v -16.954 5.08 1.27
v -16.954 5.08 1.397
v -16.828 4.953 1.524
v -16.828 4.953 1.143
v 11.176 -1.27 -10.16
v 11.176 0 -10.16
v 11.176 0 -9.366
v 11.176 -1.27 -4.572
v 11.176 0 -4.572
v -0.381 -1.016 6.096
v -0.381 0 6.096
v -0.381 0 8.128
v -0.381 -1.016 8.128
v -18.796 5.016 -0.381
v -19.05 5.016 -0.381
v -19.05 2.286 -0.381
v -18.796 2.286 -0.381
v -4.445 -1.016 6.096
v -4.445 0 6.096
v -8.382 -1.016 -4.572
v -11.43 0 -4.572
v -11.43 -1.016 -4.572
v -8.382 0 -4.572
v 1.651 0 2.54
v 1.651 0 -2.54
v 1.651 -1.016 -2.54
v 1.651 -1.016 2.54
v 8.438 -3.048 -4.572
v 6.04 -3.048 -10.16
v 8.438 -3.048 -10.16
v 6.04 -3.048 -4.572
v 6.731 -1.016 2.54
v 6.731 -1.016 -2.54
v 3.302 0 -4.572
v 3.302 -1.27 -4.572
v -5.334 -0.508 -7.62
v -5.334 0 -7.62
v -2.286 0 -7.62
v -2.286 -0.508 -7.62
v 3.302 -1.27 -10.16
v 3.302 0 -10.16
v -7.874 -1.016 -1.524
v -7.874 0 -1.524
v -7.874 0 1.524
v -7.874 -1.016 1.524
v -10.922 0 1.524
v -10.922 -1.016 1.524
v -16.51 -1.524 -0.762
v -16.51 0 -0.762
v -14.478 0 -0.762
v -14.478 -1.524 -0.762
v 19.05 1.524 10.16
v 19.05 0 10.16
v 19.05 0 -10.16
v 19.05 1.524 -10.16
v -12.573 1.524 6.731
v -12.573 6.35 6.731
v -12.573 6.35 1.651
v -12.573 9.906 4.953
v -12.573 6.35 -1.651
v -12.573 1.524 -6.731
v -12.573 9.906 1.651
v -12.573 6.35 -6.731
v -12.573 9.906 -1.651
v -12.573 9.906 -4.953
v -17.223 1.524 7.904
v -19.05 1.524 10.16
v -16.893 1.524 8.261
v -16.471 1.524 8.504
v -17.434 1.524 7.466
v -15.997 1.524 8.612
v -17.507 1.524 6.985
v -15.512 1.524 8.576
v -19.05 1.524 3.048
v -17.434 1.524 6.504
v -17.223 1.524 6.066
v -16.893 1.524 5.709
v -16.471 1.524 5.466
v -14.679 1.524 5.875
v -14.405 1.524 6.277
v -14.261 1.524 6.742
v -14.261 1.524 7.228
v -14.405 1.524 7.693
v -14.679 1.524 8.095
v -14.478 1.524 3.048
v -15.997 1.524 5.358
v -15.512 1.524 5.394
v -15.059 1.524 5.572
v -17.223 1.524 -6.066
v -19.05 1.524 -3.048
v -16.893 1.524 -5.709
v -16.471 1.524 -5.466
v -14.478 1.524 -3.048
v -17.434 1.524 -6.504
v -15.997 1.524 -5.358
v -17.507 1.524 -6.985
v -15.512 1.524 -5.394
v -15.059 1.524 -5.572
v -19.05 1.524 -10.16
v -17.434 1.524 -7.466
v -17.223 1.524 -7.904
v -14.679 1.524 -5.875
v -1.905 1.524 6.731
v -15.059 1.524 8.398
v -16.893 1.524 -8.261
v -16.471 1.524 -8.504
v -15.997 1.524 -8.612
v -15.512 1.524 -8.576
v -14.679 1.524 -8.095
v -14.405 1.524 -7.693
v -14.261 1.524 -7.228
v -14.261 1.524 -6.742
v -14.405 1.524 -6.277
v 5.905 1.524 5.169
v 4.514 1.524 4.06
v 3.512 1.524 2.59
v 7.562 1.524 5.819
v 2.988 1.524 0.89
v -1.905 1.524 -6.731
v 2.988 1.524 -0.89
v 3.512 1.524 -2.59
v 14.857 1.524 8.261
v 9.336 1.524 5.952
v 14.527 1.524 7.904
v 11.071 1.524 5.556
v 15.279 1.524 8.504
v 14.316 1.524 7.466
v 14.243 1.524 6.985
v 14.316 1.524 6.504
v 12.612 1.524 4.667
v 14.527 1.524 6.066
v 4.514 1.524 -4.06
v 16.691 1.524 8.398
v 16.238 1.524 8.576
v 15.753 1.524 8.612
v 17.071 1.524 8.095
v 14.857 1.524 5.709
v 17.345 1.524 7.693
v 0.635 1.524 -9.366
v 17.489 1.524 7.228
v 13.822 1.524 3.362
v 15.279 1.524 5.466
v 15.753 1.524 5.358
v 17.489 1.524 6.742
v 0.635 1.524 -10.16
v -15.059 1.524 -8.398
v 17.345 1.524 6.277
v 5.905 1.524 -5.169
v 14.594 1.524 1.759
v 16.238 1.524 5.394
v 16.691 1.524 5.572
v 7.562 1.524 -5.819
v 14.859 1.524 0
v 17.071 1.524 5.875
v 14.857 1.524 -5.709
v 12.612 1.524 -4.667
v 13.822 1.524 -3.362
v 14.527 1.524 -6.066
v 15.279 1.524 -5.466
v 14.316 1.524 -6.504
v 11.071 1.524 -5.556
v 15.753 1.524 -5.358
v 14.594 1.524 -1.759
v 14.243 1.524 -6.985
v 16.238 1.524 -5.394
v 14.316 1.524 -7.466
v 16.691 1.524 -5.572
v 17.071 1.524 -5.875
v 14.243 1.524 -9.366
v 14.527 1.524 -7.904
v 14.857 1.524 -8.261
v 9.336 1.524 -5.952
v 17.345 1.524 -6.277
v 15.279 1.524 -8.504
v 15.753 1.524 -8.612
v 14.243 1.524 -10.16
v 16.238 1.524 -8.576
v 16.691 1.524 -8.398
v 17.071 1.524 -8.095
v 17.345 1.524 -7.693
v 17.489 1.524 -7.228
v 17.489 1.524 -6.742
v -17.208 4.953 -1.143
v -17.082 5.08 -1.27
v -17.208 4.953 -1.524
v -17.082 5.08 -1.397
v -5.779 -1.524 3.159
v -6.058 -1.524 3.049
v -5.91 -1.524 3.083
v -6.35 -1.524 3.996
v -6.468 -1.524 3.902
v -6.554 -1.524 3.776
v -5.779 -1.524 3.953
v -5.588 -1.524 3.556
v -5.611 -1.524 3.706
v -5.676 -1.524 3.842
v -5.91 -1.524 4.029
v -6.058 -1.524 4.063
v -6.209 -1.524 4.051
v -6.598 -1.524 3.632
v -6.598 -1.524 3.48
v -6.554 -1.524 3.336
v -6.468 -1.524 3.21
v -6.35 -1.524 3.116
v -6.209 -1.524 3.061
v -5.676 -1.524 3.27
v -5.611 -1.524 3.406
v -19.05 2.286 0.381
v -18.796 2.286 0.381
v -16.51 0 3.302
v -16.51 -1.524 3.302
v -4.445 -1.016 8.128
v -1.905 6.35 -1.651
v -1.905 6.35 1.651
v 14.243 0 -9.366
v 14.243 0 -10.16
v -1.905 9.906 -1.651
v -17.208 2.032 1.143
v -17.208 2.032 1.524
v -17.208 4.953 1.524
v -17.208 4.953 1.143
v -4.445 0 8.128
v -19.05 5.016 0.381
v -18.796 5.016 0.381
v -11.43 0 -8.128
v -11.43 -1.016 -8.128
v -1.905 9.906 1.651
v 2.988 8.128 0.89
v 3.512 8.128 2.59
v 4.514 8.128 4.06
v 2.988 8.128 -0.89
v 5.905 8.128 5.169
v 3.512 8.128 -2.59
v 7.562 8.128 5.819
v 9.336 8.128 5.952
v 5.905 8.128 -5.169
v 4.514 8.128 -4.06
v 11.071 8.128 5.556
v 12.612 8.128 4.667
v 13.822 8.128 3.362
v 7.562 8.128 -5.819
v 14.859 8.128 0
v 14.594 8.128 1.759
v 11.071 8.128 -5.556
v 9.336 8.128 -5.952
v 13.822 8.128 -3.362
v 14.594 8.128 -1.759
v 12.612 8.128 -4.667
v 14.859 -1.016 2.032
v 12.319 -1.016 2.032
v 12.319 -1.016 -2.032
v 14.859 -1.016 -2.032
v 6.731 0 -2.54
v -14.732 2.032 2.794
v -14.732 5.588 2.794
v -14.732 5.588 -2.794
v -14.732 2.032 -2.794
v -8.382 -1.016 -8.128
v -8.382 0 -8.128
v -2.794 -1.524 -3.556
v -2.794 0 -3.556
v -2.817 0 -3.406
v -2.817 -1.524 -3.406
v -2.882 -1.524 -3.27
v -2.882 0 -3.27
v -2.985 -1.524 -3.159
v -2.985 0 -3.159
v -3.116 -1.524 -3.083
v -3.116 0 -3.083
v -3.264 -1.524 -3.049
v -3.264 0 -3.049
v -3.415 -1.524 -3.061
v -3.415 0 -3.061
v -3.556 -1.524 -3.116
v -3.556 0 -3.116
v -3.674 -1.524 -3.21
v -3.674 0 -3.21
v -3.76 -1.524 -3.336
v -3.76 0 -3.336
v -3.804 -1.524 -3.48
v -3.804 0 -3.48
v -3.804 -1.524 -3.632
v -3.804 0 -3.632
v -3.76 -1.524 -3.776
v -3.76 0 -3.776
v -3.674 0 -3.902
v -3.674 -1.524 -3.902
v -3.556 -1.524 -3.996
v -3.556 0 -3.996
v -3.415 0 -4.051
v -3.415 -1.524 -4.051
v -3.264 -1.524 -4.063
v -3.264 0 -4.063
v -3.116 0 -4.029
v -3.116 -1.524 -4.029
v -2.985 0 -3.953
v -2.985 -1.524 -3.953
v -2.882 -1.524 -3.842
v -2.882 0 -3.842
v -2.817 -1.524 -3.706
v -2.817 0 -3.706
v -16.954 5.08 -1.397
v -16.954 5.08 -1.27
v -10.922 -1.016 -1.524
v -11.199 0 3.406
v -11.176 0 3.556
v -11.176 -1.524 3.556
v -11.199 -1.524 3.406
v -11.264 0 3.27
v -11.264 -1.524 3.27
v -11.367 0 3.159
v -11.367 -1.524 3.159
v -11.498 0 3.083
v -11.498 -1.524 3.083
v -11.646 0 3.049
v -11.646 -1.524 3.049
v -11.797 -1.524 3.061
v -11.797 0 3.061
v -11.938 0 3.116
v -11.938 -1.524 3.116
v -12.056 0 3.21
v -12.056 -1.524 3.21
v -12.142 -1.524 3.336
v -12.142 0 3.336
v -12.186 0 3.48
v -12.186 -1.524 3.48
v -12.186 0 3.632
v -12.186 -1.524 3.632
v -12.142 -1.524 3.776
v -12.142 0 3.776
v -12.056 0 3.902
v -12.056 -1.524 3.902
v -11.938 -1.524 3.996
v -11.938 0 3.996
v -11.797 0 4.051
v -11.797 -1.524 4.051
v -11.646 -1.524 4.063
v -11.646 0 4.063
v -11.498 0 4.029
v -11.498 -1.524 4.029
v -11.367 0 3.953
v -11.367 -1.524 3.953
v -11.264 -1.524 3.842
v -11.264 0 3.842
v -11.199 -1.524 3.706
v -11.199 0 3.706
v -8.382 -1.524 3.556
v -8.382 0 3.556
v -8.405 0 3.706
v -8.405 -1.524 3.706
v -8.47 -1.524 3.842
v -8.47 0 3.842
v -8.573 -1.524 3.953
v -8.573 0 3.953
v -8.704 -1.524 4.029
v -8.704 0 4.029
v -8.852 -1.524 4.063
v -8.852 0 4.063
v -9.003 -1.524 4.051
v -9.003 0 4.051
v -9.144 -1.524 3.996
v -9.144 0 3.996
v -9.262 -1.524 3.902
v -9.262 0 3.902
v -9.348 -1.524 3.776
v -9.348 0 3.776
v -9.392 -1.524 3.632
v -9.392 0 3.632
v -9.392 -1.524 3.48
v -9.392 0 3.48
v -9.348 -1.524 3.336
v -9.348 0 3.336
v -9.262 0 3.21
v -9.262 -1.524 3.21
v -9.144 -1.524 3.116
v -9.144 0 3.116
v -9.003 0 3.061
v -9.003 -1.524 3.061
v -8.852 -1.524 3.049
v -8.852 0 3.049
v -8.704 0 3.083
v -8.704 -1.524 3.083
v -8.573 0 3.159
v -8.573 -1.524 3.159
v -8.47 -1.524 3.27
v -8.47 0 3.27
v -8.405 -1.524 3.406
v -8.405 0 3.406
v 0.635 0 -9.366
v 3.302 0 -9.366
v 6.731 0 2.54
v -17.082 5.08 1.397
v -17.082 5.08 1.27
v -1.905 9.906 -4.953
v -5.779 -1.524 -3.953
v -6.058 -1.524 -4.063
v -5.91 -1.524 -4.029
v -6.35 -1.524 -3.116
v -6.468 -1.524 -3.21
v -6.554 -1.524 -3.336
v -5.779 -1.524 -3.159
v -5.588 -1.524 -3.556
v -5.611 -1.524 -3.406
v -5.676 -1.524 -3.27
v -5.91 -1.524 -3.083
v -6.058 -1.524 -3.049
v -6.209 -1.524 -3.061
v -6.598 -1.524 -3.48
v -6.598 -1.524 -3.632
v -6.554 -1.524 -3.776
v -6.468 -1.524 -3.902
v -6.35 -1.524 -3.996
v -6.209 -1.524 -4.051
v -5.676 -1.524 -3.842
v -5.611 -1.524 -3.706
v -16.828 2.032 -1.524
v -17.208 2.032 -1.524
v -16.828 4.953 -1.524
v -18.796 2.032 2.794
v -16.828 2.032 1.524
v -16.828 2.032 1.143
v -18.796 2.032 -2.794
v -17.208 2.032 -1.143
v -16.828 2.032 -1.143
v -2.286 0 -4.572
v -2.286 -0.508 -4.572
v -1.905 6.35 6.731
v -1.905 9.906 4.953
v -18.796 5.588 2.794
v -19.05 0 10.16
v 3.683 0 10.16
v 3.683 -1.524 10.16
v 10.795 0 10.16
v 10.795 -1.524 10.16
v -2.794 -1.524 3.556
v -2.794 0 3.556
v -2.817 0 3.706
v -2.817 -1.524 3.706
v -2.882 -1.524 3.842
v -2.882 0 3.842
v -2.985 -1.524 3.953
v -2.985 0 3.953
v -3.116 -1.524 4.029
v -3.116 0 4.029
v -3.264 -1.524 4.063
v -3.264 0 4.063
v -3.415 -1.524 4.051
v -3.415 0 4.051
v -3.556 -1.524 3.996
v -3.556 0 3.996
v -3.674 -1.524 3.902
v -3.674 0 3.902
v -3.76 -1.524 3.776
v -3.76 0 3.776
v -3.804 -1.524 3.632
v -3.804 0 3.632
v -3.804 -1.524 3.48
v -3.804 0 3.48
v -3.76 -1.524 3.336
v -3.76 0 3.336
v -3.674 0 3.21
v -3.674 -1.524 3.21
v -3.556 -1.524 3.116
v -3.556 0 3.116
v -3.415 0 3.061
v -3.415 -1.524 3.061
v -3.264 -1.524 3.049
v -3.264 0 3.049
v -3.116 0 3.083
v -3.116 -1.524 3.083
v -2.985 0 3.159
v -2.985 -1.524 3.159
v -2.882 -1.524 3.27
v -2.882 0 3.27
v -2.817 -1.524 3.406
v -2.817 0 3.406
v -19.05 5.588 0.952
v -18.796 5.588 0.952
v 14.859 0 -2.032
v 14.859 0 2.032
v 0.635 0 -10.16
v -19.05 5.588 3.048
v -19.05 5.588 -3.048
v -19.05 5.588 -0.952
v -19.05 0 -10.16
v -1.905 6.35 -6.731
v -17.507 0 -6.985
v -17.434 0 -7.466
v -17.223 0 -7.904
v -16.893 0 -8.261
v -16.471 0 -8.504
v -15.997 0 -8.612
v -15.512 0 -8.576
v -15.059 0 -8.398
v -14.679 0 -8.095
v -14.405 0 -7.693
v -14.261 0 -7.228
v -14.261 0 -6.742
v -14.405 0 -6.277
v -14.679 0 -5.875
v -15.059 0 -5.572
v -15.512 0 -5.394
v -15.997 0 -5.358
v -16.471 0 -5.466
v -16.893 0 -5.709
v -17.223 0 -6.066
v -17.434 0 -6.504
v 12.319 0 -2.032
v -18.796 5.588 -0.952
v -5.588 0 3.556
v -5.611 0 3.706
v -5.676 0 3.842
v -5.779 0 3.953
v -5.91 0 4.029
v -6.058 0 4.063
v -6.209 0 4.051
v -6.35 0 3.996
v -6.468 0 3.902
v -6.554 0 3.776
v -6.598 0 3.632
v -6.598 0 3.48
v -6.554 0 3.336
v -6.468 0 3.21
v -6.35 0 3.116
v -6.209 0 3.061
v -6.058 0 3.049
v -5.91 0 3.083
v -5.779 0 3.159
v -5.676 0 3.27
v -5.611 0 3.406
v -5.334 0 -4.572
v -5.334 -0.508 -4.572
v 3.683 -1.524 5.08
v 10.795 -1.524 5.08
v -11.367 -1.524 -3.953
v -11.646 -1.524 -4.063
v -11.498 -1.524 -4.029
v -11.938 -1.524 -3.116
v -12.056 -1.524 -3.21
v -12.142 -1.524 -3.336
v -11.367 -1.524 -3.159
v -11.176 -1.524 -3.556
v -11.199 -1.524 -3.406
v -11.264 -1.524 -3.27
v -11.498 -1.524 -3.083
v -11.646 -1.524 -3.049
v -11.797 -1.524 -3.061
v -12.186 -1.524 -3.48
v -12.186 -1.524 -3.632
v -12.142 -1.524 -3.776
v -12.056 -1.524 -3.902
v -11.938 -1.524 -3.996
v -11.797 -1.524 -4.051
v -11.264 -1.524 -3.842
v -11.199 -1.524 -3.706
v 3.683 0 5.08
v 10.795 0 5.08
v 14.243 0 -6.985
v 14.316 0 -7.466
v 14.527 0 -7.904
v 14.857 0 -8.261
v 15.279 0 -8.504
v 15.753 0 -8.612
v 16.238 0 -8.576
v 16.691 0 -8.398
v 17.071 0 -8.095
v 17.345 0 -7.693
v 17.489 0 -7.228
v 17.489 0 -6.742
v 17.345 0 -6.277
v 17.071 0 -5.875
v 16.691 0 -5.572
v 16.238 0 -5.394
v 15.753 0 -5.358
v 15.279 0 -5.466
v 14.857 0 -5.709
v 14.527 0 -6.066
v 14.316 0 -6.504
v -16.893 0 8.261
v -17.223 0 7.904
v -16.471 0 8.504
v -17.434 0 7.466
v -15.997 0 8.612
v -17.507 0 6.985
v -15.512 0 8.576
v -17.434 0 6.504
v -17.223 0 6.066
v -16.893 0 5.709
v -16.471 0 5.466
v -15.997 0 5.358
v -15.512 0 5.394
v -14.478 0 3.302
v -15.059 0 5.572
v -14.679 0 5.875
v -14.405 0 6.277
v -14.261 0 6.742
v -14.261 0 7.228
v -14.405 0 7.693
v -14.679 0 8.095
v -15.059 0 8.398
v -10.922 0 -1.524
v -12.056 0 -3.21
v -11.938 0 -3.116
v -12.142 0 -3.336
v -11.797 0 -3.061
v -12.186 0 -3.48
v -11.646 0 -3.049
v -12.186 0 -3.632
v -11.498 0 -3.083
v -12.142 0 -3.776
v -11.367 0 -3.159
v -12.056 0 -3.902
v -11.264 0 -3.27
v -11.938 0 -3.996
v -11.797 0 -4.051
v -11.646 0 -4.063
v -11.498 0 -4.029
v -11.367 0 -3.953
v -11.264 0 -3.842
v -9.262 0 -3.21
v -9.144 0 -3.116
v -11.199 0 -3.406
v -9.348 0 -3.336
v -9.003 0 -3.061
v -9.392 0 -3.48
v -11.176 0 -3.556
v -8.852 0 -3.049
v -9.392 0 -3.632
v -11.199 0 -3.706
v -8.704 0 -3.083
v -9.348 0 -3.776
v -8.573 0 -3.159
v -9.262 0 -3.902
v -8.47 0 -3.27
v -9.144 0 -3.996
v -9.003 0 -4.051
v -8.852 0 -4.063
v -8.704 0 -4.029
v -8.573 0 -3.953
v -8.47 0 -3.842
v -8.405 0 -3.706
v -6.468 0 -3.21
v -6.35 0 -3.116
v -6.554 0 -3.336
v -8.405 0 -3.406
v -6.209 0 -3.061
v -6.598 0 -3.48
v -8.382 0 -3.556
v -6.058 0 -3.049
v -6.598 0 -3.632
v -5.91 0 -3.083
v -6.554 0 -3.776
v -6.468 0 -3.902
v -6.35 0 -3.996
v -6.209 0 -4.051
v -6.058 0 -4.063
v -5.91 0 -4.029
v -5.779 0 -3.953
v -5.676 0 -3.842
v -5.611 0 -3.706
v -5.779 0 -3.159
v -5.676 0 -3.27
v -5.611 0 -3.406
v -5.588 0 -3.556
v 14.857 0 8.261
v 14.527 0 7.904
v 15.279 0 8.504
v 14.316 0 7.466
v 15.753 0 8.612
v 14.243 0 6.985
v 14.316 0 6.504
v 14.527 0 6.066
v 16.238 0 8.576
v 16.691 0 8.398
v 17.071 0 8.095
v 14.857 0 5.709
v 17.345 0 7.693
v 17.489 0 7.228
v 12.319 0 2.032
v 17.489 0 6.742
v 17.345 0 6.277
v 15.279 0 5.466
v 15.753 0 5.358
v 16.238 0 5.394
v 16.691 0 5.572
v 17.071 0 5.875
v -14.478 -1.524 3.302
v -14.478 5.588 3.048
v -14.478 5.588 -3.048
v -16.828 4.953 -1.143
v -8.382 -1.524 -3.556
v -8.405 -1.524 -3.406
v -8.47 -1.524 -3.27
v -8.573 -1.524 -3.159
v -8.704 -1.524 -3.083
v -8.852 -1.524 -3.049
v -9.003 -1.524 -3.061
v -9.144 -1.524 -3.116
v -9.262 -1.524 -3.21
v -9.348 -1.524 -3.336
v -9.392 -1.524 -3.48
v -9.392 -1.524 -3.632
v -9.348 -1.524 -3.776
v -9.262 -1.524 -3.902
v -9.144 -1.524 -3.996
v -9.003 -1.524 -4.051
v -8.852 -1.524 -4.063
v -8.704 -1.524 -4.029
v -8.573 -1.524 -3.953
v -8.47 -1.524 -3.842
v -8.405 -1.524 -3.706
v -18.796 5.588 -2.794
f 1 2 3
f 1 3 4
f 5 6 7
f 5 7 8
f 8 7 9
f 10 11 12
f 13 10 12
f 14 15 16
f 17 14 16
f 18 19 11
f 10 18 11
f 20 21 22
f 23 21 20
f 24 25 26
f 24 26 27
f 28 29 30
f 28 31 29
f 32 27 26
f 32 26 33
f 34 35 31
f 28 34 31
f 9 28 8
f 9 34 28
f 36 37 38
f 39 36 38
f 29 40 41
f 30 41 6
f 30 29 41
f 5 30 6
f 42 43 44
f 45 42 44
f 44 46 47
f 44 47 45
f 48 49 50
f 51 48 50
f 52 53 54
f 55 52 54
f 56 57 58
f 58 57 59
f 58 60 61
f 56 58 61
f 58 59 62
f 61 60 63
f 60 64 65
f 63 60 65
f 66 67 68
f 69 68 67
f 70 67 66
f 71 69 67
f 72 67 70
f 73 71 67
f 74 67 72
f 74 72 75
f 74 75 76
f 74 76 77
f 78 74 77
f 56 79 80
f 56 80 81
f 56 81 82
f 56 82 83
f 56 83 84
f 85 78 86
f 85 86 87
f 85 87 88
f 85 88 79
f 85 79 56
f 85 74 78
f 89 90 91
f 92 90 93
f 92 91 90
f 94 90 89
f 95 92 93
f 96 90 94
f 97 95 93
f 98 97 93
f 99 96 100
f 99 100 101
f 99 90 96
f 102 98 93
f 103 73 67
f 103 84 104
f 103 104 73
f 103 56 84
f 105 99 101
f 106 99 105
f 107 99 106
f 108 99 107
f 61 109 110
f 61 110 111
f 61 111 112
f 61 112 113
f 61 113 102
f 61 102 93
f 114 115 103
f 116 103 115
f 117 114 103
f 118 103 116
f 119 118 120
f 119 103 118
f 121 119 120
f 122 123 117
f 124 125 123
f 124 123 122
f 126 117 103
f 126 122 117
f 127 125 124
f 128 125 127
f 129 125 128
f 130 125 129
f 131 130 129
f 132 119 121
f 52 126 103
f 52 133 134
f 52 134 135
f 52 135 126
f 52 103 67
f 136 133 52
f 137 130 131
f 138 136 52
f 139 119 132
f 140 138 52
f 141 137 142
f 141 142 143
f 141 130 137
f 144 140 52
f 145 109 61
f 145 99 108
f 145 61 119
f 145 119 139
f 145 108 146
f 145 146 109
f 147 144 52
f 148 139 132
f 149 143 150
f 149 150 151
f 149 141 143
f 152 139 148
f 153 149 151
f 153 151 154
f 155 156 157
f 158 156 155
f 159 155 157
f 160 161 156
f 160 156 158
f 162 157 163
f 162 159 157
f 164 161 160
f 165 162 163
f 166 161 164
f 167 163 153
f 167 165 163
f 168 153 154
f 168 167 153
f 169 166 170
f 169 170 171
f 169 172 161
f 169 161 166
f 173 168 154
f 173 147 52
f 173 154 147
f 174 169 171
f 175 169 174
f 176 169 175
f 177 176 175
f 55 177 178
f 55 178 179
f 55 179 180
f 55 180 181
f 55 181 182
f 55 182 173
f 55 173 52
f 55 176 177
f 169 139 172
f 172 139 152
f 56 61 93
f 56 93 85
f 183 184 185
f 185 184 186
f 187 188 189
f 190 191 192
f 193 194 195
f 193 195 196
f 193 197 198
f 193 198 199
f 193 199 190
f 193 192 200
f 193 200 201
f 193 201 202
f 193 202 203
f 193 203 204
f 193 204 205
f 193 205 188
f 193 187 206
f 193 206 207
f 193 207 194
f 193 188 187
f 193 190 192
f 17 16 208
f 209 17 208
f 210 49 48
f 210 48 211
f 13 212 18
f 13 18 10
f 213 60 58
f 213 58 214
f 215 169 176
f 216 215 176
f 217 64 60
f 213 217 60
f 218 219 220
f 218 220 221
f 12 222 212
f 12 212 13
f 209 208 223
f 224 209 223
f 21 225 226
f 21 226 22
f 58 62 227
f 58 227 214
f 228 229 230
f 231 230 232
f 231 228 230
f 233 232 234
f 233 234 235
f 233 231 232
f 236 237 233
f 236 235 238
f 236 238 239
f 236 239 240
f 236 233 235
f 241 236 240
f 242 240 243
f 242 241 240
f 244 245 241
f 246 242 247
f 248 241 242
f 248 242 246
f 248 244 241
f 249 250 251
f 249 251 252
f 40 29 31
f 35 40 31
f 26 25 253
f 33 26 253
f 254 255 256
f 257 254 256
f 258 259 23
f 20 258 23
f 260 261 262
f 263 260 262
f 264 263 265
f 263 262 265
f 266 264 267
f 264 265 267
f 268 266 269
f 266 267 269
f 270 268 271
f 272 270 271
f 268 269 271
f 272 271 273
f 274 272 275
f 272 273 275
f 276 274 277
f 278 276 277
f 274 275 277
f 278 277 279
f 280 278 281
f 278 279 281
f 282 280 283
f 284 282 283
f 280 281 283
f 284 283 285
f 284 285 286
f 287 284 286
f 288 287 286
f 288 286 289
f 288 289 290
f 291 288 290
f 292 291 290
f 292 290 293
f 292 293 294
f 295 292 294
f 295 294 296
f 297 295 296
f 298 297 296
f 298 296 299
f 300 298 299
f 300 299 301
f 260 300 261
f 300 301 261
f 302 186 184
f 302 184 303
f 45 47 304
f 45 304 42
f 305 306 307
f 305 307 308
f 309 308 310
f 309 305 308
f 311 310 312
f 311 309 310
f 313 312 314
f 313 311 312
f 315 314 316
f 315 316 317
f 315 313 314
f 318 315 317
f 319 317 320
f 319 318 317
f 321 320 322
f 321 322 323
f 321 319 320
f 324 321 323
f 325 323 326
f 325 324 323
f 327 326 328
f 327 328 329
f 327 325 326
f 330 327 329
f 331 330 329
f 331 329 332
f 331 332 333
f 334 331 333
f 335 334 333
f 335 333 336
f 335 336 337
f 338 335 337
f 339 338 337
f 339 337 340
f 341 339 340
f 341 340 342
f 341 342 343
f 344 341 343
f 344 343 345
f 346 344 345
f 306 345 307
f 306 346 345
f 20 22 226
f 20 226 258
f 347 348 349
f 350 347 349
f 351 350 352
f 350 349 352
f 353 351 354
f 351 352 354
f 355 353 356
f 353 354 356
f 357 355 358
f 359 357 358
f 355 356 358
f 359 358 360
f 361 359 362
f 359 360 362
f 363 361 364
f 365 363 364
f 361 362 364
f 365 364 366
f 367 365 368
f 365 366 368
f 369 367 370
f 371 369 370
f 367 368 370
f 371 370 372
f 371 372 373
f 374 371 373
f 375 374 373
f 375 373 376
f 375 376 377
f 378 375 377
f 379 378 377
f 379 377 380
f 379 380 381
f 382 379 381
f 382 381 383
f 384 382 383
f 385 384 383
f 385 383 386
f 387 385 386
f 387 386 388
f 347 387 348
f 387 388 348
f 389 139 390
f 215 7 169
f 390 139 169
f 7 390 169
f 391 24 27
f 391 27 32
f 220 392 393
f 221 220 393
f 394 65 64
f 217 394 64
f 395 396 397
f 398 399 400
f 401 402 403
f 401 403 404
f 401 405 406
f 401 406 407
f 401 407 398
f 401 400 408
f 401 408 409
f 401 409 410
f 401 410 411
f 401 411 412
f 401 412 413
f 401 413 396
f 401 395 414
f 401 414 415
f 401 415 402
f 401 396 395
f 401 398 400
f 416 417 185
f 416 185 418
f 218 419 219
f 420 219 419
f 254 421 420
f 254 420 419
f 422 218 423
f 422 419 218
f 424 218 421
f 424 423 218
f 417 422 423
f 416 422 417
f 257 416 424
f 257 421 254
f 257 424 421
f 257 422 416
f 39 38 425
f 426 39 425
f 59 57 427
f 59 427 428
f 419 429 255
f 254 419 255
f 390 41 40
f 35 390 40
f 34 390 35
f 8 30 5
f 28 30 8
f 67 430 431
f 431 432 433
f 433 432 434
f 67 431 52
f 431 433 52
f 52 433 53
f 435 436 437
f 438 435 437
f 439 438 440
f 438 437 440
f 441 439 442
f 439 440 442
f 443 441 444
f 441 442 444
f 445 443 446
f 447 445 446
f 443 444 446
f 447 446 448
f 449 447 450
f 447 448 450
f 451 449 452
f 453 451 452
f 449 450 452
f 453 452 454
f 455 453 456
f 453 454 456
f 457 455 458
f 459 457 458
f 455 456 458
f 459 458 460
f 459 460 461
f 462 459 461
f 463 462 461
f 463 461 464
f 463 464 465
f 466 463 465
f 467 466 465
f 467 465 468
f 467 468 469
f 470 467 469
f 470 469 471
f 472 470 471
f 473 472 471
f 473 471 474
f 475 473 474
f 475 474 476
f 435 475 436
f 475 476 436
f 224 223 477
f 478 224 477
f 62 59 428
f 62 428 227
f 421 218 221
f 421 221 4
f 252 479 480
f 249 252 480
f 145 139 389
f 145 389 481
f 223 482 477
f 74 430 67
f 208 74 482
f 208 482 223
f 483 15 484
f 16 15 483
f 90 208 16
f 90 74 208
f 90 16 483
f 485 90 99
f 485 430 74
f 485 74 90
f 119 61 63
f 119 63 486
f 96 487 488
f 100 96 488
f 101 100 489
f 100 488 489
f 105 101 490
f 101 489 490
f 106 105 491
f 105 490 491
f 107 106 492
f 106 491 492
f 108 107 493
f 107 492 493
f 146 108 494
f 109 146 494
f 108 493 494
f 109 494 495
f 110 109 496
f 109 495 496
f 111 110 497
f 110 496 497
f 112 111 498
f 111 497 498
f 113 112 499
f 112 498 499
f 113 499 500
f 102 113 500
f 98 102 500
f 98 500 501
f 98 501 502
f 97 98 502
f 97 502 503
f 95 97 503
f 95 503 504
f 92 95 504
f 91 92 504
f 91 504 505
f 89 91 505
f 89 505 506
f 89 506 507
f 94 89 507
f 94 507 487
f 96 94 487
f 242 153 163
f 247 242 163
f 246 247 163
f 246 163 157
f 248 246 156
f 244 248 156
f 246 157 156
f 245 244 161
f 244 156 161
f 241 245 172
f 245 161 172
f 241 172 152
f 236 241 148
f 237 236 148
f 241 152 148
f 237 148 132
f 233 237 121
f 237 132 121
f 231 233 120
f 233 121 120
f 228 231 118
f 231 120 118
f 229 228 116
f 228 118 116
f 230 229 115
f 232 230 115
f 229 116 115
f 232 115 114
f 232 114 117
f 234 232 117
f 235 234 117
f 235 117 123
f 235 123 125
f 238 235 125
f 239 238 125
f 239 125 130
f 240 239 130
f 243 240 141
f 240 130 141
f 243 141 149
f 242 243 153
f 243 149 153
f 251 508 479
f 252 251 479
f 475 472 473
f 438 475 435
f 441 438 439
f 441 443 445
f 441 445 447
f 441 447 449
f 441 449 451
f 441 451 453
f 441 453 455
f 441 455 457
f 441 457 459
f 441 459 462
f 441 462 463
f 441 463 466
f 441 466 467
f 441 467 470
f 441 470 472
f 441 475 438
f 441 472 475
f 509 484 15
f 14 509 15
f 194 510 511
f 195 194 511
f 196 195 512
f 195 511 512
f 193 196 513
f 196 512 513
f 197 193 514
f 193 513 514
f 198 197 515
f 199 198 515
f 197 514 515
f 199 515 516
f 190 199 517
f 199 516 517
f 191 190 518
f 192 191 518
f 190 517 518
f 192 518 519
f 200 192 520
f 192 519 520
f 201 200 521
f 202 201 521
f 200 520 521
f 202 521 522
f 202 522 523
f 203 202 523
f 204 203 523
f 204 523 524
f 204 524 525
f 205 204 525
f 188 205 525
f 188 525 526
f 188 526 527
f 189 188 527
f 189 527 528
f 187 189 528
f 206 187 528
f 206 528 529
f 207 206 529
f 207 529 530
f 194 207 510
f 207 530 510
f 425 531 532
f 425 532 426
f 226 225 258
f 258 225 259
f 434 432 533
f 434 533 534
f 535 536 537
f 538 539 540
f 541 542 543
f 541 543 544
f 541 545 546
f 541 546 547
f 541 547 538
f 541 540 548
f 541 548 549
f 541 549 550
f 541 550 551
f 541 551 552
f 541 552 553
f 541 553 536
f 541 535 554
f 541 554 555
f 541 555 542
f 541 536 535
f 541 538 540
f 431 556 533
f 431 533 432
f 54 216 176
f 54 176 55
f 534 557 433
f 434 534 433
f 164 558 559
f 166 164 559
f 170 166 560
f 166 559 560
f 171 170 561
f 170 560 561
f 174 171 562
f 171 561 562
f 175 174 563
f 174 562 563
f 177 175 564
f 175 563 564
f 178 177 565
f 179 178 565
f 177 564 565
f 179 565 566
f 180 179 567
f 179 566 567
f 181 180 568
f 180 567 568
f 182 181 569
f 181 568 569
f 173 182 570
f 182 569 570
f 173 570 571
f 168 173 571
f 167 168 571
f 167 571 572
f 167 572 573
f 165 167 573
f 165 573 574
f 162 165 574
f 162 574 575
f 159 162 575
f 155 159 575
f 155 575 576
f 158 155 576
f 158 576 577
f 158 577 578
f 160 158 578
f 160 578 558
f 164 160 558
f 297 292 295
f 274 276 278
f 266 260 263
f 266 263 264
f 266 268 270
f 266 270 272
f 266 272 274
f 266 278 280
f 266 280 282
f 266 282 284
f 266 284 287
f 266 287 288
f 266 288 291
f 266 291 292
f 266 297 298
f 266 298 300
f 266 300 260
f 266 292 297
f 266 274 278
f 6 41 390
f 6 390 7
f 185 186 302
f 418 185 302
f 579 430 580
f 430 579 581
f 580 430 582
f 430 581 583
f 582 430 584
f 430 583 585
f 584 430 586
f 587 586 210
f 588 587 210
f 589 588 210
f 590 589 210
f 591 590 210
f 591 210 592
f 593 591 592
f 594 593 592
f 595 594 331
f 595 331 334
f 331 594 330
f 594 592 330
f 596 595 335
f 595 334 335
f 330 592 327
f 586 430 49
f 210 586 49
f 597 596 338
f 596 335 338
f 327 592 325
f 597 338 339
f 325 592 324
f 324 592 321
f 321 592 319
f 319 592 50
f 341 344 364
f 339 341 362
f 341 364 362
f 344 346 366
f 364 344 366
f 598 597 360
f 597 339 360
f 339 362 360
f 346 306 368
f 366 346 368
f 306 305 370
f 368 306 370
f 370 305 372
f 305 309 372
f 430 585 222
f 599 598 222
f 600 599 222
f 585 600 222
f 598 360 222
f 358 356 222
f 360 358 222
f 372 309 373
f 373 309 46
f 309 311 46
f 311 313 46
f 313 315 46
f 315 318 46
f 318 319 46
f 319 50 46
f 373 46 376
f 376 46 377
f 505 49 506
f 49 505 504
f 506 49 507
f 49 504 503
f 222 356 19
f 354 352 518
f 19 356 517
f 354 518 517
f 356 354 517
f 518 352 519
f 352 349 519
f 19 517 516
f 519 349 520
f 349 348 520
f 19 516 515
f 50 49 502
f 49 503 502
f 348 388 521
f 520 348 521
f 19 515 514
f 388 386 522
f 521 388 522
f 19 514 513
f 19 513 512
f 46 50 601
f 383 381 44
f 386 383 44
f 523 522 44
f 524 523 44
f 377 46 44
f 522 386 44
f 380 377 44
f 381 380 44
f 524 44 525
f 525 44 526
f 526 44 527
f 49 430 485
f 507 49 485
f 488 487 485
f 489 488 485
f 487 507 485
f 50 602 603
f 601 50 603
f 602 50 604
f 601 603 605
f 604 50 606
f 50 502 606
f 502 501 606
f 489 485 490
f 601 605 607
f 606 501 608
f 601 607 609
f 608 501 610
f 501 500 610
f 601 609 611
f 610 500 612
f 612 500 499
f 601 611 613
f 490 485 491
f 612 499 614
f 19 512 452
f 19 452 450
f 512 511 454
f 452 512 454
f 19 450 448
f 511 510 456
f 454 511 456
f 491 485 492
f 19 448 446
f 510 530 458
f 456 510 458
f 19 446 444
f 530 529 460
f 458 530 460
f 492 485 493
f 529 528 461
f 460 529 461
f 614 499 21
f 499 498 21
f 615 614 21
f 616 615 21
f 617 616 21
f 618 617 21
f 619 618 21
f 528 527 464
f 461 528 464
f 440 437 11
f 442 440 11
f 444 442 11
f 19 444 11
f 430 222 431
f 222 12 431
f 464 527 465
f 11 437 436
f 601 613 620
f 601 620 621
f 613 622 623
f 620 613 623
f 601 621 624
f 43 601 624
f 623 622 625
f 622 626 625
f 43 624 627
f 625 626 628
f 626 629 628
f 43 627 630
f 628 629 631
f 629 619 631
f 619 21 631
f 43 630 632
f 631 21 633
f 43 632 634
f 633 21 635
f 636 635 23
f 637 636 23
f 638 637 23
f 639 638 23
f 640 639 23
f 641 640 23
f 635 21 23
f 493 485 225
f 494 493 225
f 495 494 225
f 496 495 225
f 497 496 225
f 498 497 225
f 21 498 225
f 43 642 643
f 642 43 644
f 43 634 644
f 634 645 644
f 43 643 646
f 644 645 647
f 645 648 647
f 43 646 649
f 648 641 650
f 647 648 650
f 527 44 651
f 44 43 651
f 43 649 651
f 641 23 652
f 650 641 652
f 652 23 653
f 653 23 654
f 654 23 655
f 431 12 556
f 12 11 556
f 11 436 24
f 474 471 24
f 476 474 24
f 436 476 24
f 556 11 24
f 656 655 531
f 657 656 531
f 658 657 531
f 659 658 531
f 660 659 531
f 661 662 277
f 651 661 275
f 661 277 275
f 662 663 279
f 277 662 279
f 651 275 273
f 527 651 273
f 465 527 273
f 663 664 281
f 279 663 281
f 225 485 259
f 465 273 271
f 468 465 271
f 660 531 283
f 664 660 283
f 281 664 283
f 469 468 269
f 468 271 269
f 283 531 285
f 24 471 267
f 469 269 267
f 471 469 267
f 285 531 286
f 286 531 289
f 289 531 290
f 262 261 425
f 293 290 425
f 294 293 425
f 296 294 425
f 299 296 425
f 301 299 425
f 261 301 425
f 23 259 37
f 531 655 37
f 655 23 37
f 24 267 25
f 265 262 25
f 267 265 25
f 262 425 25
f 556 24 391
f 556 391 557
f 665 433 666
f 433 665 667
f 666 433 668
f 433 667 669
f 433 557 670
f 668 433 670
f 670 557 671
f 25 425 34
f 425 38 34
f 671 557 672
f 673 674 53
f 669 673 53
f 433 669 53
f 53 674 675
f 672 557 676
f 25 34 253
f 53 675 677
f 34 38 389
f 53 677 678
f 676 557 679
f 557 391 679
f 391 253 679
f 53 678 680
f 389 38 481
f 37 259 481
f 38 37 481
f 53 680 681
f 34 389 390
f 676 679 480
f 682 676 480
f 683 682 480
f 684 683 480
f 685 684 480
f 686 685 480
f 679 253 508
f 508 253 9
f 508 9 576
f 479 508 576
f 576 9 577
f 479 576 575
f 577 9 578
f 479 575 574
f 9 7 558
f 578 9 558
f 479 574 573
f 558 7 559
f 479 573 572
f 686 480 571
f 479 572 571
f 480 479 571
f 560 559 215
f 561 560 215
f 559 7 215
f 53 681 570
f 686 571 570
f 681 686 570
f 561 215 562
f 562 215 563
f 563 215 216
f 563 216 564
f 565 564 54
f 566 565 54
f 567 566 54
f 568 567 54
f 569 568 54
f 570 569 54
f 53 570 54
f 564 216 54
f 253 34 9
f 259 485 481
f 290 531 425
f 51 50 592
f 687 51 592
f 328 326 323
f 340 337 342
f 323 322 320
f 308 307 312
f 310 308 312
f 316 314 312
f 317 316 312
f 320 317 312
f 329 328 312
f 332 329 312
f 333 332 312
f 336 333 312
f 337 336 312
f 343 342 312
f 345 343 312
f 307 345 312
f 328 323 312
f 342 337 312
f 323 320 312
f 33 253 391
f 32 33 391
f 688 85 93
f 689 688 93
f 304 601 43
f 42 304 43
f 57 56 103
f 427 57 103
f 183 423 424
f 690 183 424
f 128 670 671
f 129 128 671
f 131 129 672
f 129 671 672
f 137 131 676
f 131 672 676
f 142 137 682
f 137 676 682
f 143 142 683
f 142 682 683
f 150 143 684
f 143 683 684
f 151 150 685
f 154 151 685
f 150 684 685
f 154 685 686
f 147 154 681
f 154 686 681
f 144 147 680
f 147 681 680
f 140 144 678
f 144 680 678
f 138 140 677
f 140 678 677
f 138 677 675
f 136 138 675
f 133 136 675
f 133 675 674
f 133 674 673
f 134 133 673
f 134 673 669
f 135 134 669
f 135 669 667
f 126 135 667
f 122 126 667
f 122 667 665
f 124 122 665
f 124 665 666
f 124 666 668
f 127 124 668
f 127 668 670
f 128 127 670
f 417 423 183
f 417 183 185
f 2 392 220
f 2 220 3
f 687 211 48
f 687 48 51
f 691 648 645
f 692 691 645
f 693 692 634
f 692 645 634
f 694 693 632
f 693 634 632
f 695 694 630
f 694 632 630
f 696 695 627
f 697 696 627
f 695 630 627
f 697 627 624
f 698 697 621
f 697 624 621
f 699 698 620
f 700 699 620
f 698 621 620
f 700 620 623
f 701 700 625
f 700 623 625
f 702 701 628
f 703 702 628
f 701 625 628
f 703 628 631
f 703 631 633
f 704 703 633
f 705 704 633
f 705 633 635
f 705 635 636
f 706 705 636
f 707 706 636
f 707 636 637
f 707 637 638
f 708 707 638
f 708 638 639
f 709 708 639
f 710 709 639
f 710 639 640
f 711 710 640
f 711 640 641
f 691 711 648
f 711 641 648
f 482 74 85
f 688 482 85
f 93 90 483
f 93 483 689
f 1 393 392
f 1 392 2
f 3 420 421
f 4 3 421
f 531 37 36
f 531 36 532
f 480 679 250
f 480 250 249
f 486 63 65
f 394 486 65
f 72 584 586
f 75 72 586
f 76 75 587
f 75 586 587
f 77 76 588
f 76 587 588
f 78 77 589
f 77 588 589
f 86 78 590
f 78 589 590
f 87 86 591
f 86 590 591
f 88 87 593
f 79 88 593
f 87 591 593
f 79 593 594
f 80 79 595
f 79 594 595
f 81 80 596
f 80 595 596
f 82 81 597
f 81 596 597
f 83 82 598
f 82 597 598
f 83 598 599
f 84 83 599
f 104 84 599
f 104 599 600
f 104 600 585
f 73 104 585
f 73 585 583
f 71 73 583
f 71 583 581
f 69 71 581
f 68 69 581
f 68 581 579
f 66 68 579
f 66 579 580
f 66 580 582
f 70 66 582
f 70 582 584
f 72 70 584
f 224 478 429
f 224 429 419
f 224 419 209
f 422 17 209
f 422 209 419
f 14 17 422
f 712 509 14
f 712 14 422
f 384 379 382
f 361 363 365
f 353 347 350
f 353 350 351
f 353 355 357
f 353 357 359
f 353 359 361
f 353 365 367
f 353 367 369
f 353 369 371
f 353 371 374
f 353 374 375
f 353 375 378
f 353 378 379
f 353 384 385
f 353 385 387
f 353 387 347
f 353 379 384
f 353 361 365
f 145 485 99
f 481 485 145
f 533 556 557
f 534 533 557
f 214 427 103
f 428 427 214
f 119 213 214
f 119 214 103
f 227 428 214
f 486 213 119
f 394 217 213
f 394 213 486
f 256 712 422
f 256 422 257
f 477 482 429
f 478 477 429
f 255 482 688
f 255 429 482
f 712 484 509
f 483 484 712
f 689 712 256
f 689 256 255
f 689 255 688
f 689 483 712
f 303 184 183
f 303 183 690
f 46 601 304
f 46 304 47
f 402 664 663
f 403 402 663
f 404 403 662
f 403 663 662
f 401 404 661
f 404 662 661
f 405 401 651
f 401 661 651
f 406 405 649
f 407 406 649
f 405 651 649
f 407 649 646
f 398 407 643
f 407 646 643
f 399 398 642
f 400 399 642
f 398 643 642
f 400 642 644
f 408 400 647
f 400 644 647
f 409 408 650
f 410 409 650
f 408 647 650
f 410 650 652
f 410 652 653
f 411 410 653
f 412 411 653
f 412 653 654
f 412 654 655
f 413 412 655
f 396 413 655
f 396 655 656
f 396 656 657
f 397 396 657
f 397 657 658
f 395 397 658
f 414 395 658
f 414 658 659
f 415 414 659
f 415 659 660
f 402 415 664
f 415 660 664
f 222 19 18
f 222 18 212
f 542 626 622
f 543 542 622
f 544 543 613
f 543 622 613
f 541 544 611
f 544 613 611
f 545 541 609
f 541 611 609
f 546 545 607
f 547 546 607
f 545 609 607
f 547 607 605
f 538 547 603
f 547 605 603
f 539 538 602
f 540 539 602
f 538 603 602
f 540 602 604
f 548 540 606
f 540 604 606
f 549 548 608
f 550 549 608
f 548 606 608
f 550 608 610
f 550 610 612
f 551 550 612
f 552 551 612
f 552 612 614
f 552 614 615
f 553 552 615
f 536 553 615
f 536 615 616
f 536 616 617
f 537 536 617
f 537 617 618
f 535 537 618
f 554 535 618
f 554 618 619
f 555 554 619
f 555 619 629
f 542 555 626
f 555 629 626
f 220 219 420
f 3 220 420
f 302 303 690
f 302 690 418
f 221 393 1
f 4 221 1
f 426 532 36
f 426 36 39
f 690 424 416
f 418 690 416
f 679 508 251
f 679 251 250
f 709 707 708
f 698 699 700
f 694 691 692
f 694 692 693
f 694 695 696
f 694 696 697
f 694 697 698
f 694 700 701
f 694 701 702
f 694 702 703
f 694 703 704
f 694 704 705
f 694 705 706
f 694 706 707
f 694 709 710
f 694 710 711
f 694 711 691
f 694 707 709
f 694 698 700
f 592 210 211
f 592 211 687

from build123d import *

# Parameters (mm, degrees)
SKETCH1_W               = 38.1
SKETCH1_H               = 20.32
BOSS_EXTRUDE1_DEPTH     = 1.524
F_4_CLEARANCE_HOLE1_D   = 3.2639
SKETCH4_W               = 4.572
SKETCH4_H               = 6.096
BOSS_EXTRUDE2_DEPTH     = 4.064
SKETCH5_R               = 5.969
BOSS_EXTRUDE3_DEPTH     = 6.604
SKETCH6_W               = 10.668
SKETCH6_H               = 13.462
BOSS_EXTRUDE4_DEPTH     = 4.826
BOSS_EXTRUDE5_DEPTH     = 10.668
SKETCH8_W               = 7.874
SKETCH8_H               = 5.588
BOSS_EXTRUDE6_DEPTH     = 3.048
SKETCH9_W               = 7.112
SKETCH9_H               = 5.08
BOSS_EXTRUDE7_DEPTH     = 1.524
SKETCH10_W              = 2.54
SKETCH10_H              = 4.064
BOSS_EXTRUDE8_DEPTH     = 1.016
SKETCH11_W              = 5.08
SKETCH11_H              = 5.08
BOSS_EXTRUDE9_DEPTH     = 1.016
SKETCH12_W              = 4.064
SKETCH12_H              = 2.032
BOSS_EXTRUDE10_DEPTH    = 1.016
SKETCH13_W              = 3.048
SKETCH13_H              = 3.048
BOSS_EXTRUDE11_DEPTH    = 0.508
SKETCH14_W              = 3.048
SKETCH14_H              = 3.556
BOSS_EXTRUDE12_DEPTH    = 1.016
SKETCH15_W              = 2.032
SKETCH15_H              = 4.064
BOSS_EXTRUDE13_DEPTH    = 1.524
SKETCH16_W              = 3.048
SKETCH16_H              = 3.048
BOSS_EXTRUDE14_DEPTH    = 1.016
SKETCH17_R              = 0.508
BOSS_EXTRUDE15_DEPTH    = 1.524
LPATTERN1_COUNT         = 4
LPATTERN1_PITCH         = 2.794
MIRROR1_COPY_1_SKETCH_R = 0.508
MIRROR1_COPY_1_DEPTH    = 1.524
MIRROR1_COPY_2_SKETCH_R = 0.508
MIRROR1_COPY_2_DEPTH    = 1.524
MIRROR1_COPY_3_SKETCH_R = 0.508
MIRROR1_COPY_3_DEPTH    = 1.524
SKETCH22_W              = 13.60805
SKETCH22_H              = 0.79375
CUT_EXTRUDE2_DEPTH      = 1.524
SKETCH24_W              = 4.064
SKETCH24_H              = 5.588
CUT_EXTRUDE3_DEPTH      = 3.556
SKETCH25_W              = 0.381
SKETCH25_H              = 0.381
BOSS_EXTRUDE16_DEPTH    = 3.048
CHAMFER1_SIZE           = 0.127
CUT_EXTRUDE4_DEPTH      = 0.254
CHAMFER2_SIZE           = 1.778
CHAMFER2_SIZE2          = 2.737879906
CHAMFER2_PART_2_SIZE    = 1.778
CHAMFER2_PART_2_SIZE2   = 2.737879906


with BuildPart() as part:
    # Sketch1 → Boss-Extrude1 (new body)
    with BuildSketch(Plane(origin=(0, 0, 0), x_dir=(1, 0, 0), z_dir=(0, 1, 0))):
        Rectangle(SKETCH1_W, SKETCH1_H)
    extrude(amount=BOSS_EXTRUDE1_DEPTH)

    # #4 Clearance Hole1 (through all)
    with Locations(Plane(origin=(0, 1.524, 0), x_dir=(1, 0, 0), z_dir=(0, 1, 0))):
        with Locations((-15.875, 6.985), (15.875, -6.985), (-15.875, -6.985), (15.875, 6.985)):
            Hole(F_4_CLEARANCE_HOLE1_D / 2)

    # Sketch4 → Boss-Extrude2 (add)
    with BuildSketch(Plane(origin=(0, 1.524, 0), x_dir=(1, 0, 0), z_dir=(0, 1, 0))):
        with Locations((-16.764, 0)):
            Rectangle(SKETCH4_W, SKETCH4_H)
    extrude(amount=BOSS_EXTRUDE2_DEPTH)

    # Sketch5 → Boss-Extrude3 (add)
    with BuildSketch(Plane(origin=(0, 1.524, 0), x_dir=(1, 0, 0), z_dir=(0, 1, 0))):
        with Locations((8.89, 0)):
            Circle(SKETCH5_R)
    extrude(amount=BOSS_EXTRUDE3_DEPTH)

    # Sketch6 → Boss-Extrude4 (add)
    with BuildSketch(Plane(origin=(0, 1.524, 0), x_dir=(1, 0, 0), z_dir=(0, 1, 0))):
        with Locations((-7.239, 0)):
            Rectangle(SKETCH6_W, SKETCH6_H)
    extrude(amount=BOSS_EXTRUDE4_DEPTH)

    # Sketch7 → Boss-Extrude5 (add)
    with BuildSketch(Plane.ZY.offset(12.573)):
        Polygon((-6.731, 6.35), (-4.953, 9.906), (-1.651, 9.906), (-1.651, 6.35), align=None)
        Polygon((6.731, 6.35), (4.953, 9.906), (1.651, 9.906), (1.651, 6.35), align=None)
    extrude(amount=-BOSS_EXTRUDE5_DEPTH)

    # Sketch8 → Boss-Extrude6 (add)
    with BuildSketch(Plane.XZ):
        with Locations((7.239, -7.366)):
            Rectangle(SKETCH8_W, SKETCH8_H)
    extrude(amount=BOSS_EXTRUDE6_DEPTH)

    # Sketch9 → Boss-Extrude7 (add)
    with BuildSketch(Plane.XZ):
        with Locations((7.239, 7.62)):
            Rectangle(SKETCH9_W, SKETCH9_H)
    extrude(amount=BOSS_EXTRUDE7_DEPTH)

    # Sketch10 → Boss-Extrude8 (add)
    with BuildSketch(Plane.XZ):
        with Locations((13.589, 0)):
            Rectangle(SKETCH10_W, SKETCH10_H)
    extrude(amount=BOSS_EXTRUDE8_DEPTH)

    # Sketch11 → Boss-Extrude9 (add)
    with BuildSketch(Plane.XZ):
        with Locations((4.191, 0)):
            Rectangle(SKETCH11_W, SKETCH11_H)
    extrude(amount=BOSS_EXTRUDE9_DEPTH)

    # Sketch12 → Boss-Extrude10 (add)
    with BuildSketch(Plane.XZ):
        with Locations((-2.413, 7.112)):
            Rectangle(SKETCH12_W, SKETCH12_H)
    extrude(amount=BOSS_EXTRUDE10_DEPTH)

    # Sketch13 → Boss-Extrude11 (add)
    with BuildSketch(Plane.XZ):
        with Locations((-3.81, -6.096)):
            Rectangle(SKETCH13_W, SKETCH13_H)
    extrude(amount=BOSS_EXTRUDE11_DEPTH)

    # Sketch14 → Boss-Extrude12 (add)
    with BuildSketch(Plane.XZ):
        with Locations((-9.906, -6.35)):
            Rectangle(SKETCH14_W, SKETCH14_H)
    extrude(amount=BOSS_EXTRUDE12_DEPTH)

    # Sketch15 → Boss-Extrude13 (add)
    with BuildSketch(Plane.XZ):
        with Locations((-15.494, 1.27)):
            Rectangle(SKETCH15_W, SKETCH15_H)
    extrude(amount=BOSS_EXTRUDE13_DEPTH)

    # Sketch16 → Boss-Extrude14 (add)
    with BuildSketch(Plane.XZ):
        with Locations((-9.398, 0)):
            Rectangle(SKETCH16_W, SKETCH16_H)
    extrude(amount=BOSS_EXTRUDE14_DEPTH)

    # Sketch17 → Boss-Extrude15 (add)
    with BuildSketch(Plane.XZ):
        with Locations((-11.684, -3.556)):
            Circle(SKETCH17_R)
    boss_extrude15 = extrude(amount=BOSS_EXTRUDE15_DEPTH)

    # LPattern1: Boss-Extrude15 ×4
    with Locations(*[(i * LPATTERN1_PITCH, 0, 0) for i in range(1, LPATTERN1_COUNT)]):
        add(boss_extrude15)

    # Mirror1: Boss-Extrude15 across plane
    add(boss_extrude15.mirror(Plane.XY))

    # Mirror1 copy 1 sketch → Mirror1 copy 1 (add)
    with BuildSketch(Plane(origin=(2.794, 0, 0), x_dir=(1, 0, 0), z_dir=(0, -1, 0))):
        with Locations((-11.684, 3.556)):
            Circle(MIRROR1_COPY_1_SKETCH_R)
    extrude(amount=MIRROR1_COPY_1_DEPTH)

    # Mirror1 copy 2 sketch → Mirror1 copy 2 (add)
    with BuildSketch(Plane(origin=(5.588, 0, 0), x_dir=(1, 0, 0), z_dir=(0, -1, 0))):
        with Locations((-11.684, 3.556)):
            Circle(MIRROR1_COPY_2_SKETCH_R)
    extrude(amount=MIRROR1_COPY_2_DEPTH)

    # Mirror1 copy 3 sketch → Mirror1 copy 3 (add)
    with BuildSketch(Plane(origin=(8.382, 0, 0), x_dir=(1, 0, 0), z_dir=(0, -1, 0))):
        with Locations((-11.684, 3.556)):
            Circle(MIRROR1_COPY_3_SKETCH_R)
    extrude(amount=MIRROR1_COPY_3_DEPTH)

    # Sketch22 → Cut-Extrude2 (cut)
    with BuildSketch(Plane(origin=(0, 1.524, 0), x_dir=(1, 0, 0), z_dir=(0, 1, 0))):
        with Locations((7.439025, 9.763125)):
            Rectangle(SKETCH22_W, SKETCH22_H)
    extrude(amount=-CUT_EXTRUDE2_DEPTH, mode=Mode.SUBTRACT)

    # Sketch24 → Cut-Extrude3 (cut)
    with BuildSketch(Plane(origin=(0, 5.588, 0), x_dir=(1, 0, 0), z_dir=(0, 1, 0))):
        with Locations((-16.764, 0)):
            Rectangle(SKETCH24_W, SKETCH24_H)
    extrude(amount=-CUT_EXTRUDE3_DEPTH, mode=Mode.SUBTRACT)

    # Sketch25 → Boss-Extrude16 (add)
    with BuildSketch(Plane(origin=(0, 2.032, 0), x_dir=(1, 0, 0), z_dir=(0, 1, 0))):
        with Locations((-17.018, 1.3335)):
            Rectangle(SKETCH25_W, SKETCH25_H)
        with Locations((-17.018, -1.3335)):
            Rectangle(SKETCH25_W, SKETCH25_H)
    extrude(amount=BOSS_EXTRUDE16_DEPTH)

    # Chamfer1
    chamfer1_edges = [part.edges().sort_by_distance(p)[0] for p in [
        (-17.018, 5.08, -1.524),
        (-17.2085, 5.08, -1.3335),
        (-17.018, 5.08, -1.143),
        (-16.8275, 5.08, -1.3335),
        (-17.018, 5.08, 1.143),
        (-17.2085, 5.08, 1.3335),
        (-17.018, 5.08, 1.524),
        (-16.8275, 5.08, 1.3335),
    ]]
    chamfer(chamfer1_edges, length=CHAMFER1_SIZE)

    # Sketch26 → Cut-Extrude4 (cut)
    with BuildSketch(Plane.ZY.offset(19.05)):
        Polygon((-0.9525, 5.588), (-0.381, 5.0165), (-0.381, 2.286), (0.381, 2.286), (0.381, 5.0165), (0.9525, 5.588), align=None)
    extrude(amount=-CUT_EXTRUDE4_DEPTH, mode=Mode.SUBTRACT)

    # Chamfer2
    chamfer2_edges = [part.edges().sort_by_distance(p)[0] for p in [
        (3.302, -3.048, -7.366),
    ]]
    chamfer2_side = [part.faces().sort_by_distance(p)[0] for p in [
        (3.302, -1.524, -7.366),
    ]]
    chamfer(chamfer2_edges, length=CHAMFER2_SIZE, length2=CHAMFER2_SIZE2, reference=chamfer2_side[0])

    # Chamfer2 part 2
    chamfer2_part_2_edges = [part.edges().sort_by_distance(p)[0] for p in [
        (11.176, -3.048, -7.366),
    ]]
    chamfer2_part_2_side = [part.faces().sort_by_distance(p)[0] for p in [
        (11.176, -1.524, -7.366),
    ]]
    chamfer(chamfer2_part_2_edges, length=CHAMFER2_PART_2_SIZE, length2=CHAMFER2_PART_2_SIZE2, reference=chamfer2_part_2_side[0])


solid = part.part
